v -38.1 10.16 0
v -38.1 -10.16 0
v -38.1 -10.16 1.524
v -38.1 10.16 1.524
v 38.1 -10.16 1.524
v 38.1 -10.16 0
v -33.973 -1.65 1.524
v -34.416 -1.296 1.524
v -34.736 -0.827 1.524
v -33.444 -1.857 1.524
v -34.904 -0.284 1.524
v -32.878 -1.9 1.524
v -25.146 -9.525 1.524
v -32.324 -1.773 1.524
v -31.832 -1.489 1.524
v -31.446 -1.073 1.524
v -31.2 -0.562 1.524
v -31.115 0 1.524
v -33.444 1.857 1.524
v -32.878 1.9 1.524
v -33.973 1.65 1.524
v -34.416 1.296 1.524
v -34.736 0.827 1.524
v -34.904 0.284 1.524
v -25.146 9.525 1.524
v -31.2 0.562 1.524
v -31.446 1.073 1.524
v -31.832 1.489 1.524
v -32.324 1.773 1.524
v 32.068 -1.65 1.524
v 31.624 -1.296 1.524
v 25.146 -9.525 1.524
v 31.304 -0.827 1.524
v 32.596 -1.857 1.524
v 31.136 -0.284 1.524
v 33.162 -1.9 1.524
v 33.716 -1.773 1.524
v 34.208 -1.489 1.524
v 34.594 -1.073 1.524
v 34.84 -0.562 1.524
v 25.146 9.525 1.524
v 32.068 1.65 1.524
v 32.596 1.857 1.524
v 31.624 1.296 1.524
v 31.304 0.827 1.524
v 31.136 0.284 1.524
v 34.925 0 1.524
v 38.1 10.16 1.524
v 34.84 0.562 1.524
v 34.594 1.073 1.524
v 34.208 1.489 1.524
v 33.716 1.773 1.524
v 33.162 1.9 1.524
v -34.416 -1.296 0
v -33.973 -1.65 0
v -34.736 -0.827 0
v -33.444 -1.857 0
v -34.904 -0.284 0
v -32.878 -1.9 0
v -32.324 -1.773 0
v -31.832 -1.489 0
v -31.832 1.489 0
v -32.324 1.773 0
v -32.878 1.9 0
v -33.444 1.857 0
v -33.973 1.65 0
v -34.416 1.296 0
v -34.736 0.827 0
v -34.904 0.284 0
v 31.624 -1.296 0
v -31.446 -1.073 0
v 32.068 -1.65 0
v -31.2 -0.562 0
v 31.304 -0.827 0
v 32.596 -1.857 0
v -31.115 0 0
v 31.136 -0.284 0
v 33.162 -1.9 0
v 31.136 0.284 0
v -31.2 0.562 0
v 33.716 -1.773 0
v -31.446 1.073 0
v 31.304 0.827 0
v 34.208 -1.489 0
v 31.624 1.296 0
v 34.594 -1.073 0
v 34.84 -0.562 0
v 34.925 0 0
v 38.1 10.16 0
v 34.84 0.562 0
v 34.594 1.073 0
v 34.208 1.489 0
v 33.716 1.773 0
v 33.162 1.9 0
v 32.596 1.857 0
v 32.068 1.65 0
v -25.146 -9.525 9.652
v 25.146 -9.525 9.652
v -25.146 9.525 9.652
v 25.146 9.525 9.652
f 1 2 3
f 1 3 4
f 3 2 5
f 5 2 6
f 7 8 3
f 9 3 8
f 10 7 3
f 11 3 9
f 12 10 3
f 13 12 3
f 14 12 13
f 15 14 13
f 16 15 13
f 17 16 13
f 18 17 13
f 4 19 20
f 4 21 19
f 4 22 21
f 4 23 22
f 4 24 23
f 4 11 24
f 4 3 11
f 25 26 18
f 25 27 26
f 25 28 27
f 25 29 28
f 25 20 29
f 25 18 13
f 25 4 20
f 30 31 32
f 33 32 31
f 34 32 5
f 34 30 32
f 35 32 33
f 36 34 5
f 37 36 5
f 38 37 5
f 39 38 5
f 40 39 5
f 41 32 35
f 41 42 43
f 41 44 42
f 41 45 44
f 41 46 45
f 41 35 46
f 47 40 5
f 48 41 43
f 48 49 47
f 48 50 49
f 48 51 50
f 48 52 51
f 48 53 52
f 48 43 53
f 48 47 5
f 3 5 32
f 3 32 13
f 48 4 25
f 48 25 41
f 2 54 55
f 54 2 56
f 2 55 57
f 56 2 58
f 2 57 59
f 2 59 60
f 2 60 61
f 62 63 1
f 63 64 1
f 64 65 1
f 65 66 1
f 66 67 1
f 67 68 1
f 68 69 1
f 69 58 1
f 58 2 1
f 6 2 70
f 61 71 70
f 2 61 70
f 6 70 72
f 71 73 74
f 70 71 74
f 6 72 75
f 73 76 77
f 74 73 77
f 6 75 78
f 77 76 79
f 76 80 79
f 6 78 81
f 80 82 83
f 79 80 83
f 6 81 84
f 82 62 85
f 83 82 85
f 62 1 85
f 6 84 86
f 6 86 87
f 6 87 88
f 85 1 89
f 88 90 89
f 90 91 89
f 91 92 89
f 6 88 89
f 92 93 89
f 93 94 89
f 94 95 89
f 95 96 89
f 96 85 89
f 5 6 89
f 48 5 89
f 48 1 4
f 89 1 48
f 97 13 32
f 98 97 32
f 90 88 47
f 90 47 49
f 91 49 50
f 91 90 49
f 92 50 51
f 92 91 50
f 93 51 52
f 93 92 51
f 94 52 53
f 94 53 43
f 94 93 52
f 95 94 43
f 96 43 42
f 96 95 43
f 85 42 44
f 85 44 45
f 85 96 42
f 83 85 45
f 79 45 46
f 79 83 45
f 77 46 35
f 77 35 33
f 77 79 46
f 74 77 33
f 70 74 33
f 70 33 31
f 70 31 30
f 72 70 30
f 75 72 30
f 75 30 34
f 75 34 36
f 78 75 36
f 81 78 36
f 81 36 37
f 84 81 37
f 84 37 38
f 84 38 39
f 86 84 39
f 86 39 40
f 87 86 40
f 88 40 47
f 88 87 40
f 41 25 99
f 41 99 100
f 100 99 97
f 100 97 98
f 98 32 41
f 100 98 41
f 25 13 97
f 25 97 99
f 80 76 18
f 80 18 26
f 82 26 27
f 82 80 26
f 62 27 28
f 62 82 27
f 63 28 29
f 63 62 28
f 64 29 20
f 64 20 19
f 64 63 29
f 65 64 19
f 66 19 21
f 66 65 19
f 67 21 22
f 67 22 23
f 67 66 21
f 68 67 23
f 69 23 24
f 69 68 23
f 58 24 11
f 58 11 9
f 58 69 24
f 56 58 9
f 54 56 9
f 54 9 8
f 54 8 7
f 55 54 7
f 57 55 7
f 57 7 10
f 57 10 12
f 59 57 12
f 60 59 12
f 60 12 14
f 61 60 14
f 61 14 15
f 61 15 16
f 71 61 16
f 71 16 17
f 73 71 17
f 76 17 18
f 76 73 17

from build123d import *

# Parameters (mm, degrees)
F0_W      = 76.2
F0_H      = 20.32
F0_R      = 1.905
F1_DEPTH  = 1.524
F2_W      = 50.292
F2_H      = 19.05
F3_DEPTH  = 8.128
F4_W      = 53.467
F4_H      = 35.814
F4_R      = 1.905
F5_DEPTH  = 1.6002
F6_W      = 25.4
F6_H      = 10.16
F7_DEPTH  = 8.128
F8_R      = 1.15
F9_DEPTH  = 3
F11_DEPTH = 3.6
F12_W     = 25
F12_H     = 5
F13_DEPTH = 1.6


with BuildPart() as f1:
    # F0 (on Top) → F1 (new body)
    with BuildSketch(Plane.XY):
        Rectangle(F0_W, F0_H)
        with Locations((-33.02, 0)):
            Circle(F0_R, mode=Mode.SUBTRACT)
        with Locations((33.02, 0)):
            Circle(F0_R, mode=Mode.SUBTRACT)
    extrude(amount=F1_DEPTH)

    # F2 (on face) → F3 (join)
    with BuildSketch(Plane.XY.offset(1.524)):
        Rectangle(F2_W, F2_H)
    extrude(amount=F3_DEPTH)


with BuildPart() as f5:
    # F4 (on Top) → F5 (new body)
    with BuildSketch(Plane.XY):
        with Locations((55.63927, 42.330817)):
            Rectangle(F4_W, F4_H)
        with Locations((33.98577, 40.933817)):
            Circle(F4_R, mode=Mode.SUBTRACT)
        with Locations((72.08577, 40.933817)):
            Circle(F4_R, mode=Mode.SUBTRACT)
    extrude(amount=F5_DEPTH)

    # F6 (on face) → F7 (join)
    with BuildSketch(Plane.XY.offset(1.6002)):
        with Locations((53.03577, 40.933817)):
            Rectangle(F6_W, F6_H)
    extrude(amount=F7_DEPTH)


with BuildPart() as f9:
    # F8 (on Top) → F9 (new body)
    with BuildSketch(Plane.XY):
        with BuildLine():
            ThreePointArc((34.542687, -63.528296), (35.27492, -65.296063), (37.042687, -66.028296))
            Line((37.042687, -66.028296), (97.042687, -66.028296))
            ThreePointArc((97.042687, -66.028296), (98.810454, -65.296063), (99.542687, -63.528296))
            Line((99.542687, -63.528296), (99.542687, -4.528296))
            ThreePointArc((99.542687, -4.528296), (98.810454, -2.760529), (97.042687, -2.028296))
            Line((97.042687, -2.028296), (37.042687, -2.028296))
            ThreePointArc((37.042687, -2.028296), (35.27492, -2.760529), (34.542687, -4.528296))
            Line((34.542687, -4.528296), (34.542687, -63.528296))
        make_face()
        with Locations((37.042687, -63.528296)):
            Circle(F8_R, mode=Mode.SUBTRACT)
        with Locations((97.042687, -63.528296)):
            Circle(F8_R, mode=Mode.SUBTRACT)
        with Locations((37.042687, -4.528296)):
            Circle(F8_R, mode=Mode.SUBTRACT)
        with Locations((97.042687, -4.528296)):
            Circle(F8_R, mode=Mode.SUBTRACT)
    extrude(amount=F9_DEPTH)

    # F10 (on face) → F11 (join)
    with BuildSketch(Plane.XY.offset(3)):
        with BuildLine():
            Line((93.042687, -5.528296), (41.042687, -5.528296))
            ThreePointArc((41.042687, -5.528296), (38.21426, -6.699869), (37.042687, -9.528296))
            Line((37.042687, -9.528296), (37.042687, -58.528296))
            ThreePointArc((37.042687, -58.528296), (38.21426, -61.356723), (41.042687, -62.528296))
            Line((41.042687, -62.528296), (93.042687, -62.528296))
            ThreePointArc((93.042687, -62.528296), (95.871114, -61.356723), (97.042687, -58.528296))
            Line((97.042687, -58.528296), (97.042687, -9.528296))
            ThreePointArc((97.042687, -9.528296), (95.871114, -6.699869), (93.042687, -5.528296))
        make_face()
    extrude(amount=F11_DEPTH)

    # F12 (on face) → F13 (join)
    with BuildSketch(Plane(origin=(0, 0, 0), x_dir=(1, 0, 0), z_dir=(0, 0, -1))):
        with Locations((54.542687, 68.528296)):
            Rectangle(F12_W, F12_H)
        with Locations((79.542687, 68.528296)):
            Rectangle(F12_W, F12_H)
    extrude(amount=-F13_DEPTH)


solid = f1.part
